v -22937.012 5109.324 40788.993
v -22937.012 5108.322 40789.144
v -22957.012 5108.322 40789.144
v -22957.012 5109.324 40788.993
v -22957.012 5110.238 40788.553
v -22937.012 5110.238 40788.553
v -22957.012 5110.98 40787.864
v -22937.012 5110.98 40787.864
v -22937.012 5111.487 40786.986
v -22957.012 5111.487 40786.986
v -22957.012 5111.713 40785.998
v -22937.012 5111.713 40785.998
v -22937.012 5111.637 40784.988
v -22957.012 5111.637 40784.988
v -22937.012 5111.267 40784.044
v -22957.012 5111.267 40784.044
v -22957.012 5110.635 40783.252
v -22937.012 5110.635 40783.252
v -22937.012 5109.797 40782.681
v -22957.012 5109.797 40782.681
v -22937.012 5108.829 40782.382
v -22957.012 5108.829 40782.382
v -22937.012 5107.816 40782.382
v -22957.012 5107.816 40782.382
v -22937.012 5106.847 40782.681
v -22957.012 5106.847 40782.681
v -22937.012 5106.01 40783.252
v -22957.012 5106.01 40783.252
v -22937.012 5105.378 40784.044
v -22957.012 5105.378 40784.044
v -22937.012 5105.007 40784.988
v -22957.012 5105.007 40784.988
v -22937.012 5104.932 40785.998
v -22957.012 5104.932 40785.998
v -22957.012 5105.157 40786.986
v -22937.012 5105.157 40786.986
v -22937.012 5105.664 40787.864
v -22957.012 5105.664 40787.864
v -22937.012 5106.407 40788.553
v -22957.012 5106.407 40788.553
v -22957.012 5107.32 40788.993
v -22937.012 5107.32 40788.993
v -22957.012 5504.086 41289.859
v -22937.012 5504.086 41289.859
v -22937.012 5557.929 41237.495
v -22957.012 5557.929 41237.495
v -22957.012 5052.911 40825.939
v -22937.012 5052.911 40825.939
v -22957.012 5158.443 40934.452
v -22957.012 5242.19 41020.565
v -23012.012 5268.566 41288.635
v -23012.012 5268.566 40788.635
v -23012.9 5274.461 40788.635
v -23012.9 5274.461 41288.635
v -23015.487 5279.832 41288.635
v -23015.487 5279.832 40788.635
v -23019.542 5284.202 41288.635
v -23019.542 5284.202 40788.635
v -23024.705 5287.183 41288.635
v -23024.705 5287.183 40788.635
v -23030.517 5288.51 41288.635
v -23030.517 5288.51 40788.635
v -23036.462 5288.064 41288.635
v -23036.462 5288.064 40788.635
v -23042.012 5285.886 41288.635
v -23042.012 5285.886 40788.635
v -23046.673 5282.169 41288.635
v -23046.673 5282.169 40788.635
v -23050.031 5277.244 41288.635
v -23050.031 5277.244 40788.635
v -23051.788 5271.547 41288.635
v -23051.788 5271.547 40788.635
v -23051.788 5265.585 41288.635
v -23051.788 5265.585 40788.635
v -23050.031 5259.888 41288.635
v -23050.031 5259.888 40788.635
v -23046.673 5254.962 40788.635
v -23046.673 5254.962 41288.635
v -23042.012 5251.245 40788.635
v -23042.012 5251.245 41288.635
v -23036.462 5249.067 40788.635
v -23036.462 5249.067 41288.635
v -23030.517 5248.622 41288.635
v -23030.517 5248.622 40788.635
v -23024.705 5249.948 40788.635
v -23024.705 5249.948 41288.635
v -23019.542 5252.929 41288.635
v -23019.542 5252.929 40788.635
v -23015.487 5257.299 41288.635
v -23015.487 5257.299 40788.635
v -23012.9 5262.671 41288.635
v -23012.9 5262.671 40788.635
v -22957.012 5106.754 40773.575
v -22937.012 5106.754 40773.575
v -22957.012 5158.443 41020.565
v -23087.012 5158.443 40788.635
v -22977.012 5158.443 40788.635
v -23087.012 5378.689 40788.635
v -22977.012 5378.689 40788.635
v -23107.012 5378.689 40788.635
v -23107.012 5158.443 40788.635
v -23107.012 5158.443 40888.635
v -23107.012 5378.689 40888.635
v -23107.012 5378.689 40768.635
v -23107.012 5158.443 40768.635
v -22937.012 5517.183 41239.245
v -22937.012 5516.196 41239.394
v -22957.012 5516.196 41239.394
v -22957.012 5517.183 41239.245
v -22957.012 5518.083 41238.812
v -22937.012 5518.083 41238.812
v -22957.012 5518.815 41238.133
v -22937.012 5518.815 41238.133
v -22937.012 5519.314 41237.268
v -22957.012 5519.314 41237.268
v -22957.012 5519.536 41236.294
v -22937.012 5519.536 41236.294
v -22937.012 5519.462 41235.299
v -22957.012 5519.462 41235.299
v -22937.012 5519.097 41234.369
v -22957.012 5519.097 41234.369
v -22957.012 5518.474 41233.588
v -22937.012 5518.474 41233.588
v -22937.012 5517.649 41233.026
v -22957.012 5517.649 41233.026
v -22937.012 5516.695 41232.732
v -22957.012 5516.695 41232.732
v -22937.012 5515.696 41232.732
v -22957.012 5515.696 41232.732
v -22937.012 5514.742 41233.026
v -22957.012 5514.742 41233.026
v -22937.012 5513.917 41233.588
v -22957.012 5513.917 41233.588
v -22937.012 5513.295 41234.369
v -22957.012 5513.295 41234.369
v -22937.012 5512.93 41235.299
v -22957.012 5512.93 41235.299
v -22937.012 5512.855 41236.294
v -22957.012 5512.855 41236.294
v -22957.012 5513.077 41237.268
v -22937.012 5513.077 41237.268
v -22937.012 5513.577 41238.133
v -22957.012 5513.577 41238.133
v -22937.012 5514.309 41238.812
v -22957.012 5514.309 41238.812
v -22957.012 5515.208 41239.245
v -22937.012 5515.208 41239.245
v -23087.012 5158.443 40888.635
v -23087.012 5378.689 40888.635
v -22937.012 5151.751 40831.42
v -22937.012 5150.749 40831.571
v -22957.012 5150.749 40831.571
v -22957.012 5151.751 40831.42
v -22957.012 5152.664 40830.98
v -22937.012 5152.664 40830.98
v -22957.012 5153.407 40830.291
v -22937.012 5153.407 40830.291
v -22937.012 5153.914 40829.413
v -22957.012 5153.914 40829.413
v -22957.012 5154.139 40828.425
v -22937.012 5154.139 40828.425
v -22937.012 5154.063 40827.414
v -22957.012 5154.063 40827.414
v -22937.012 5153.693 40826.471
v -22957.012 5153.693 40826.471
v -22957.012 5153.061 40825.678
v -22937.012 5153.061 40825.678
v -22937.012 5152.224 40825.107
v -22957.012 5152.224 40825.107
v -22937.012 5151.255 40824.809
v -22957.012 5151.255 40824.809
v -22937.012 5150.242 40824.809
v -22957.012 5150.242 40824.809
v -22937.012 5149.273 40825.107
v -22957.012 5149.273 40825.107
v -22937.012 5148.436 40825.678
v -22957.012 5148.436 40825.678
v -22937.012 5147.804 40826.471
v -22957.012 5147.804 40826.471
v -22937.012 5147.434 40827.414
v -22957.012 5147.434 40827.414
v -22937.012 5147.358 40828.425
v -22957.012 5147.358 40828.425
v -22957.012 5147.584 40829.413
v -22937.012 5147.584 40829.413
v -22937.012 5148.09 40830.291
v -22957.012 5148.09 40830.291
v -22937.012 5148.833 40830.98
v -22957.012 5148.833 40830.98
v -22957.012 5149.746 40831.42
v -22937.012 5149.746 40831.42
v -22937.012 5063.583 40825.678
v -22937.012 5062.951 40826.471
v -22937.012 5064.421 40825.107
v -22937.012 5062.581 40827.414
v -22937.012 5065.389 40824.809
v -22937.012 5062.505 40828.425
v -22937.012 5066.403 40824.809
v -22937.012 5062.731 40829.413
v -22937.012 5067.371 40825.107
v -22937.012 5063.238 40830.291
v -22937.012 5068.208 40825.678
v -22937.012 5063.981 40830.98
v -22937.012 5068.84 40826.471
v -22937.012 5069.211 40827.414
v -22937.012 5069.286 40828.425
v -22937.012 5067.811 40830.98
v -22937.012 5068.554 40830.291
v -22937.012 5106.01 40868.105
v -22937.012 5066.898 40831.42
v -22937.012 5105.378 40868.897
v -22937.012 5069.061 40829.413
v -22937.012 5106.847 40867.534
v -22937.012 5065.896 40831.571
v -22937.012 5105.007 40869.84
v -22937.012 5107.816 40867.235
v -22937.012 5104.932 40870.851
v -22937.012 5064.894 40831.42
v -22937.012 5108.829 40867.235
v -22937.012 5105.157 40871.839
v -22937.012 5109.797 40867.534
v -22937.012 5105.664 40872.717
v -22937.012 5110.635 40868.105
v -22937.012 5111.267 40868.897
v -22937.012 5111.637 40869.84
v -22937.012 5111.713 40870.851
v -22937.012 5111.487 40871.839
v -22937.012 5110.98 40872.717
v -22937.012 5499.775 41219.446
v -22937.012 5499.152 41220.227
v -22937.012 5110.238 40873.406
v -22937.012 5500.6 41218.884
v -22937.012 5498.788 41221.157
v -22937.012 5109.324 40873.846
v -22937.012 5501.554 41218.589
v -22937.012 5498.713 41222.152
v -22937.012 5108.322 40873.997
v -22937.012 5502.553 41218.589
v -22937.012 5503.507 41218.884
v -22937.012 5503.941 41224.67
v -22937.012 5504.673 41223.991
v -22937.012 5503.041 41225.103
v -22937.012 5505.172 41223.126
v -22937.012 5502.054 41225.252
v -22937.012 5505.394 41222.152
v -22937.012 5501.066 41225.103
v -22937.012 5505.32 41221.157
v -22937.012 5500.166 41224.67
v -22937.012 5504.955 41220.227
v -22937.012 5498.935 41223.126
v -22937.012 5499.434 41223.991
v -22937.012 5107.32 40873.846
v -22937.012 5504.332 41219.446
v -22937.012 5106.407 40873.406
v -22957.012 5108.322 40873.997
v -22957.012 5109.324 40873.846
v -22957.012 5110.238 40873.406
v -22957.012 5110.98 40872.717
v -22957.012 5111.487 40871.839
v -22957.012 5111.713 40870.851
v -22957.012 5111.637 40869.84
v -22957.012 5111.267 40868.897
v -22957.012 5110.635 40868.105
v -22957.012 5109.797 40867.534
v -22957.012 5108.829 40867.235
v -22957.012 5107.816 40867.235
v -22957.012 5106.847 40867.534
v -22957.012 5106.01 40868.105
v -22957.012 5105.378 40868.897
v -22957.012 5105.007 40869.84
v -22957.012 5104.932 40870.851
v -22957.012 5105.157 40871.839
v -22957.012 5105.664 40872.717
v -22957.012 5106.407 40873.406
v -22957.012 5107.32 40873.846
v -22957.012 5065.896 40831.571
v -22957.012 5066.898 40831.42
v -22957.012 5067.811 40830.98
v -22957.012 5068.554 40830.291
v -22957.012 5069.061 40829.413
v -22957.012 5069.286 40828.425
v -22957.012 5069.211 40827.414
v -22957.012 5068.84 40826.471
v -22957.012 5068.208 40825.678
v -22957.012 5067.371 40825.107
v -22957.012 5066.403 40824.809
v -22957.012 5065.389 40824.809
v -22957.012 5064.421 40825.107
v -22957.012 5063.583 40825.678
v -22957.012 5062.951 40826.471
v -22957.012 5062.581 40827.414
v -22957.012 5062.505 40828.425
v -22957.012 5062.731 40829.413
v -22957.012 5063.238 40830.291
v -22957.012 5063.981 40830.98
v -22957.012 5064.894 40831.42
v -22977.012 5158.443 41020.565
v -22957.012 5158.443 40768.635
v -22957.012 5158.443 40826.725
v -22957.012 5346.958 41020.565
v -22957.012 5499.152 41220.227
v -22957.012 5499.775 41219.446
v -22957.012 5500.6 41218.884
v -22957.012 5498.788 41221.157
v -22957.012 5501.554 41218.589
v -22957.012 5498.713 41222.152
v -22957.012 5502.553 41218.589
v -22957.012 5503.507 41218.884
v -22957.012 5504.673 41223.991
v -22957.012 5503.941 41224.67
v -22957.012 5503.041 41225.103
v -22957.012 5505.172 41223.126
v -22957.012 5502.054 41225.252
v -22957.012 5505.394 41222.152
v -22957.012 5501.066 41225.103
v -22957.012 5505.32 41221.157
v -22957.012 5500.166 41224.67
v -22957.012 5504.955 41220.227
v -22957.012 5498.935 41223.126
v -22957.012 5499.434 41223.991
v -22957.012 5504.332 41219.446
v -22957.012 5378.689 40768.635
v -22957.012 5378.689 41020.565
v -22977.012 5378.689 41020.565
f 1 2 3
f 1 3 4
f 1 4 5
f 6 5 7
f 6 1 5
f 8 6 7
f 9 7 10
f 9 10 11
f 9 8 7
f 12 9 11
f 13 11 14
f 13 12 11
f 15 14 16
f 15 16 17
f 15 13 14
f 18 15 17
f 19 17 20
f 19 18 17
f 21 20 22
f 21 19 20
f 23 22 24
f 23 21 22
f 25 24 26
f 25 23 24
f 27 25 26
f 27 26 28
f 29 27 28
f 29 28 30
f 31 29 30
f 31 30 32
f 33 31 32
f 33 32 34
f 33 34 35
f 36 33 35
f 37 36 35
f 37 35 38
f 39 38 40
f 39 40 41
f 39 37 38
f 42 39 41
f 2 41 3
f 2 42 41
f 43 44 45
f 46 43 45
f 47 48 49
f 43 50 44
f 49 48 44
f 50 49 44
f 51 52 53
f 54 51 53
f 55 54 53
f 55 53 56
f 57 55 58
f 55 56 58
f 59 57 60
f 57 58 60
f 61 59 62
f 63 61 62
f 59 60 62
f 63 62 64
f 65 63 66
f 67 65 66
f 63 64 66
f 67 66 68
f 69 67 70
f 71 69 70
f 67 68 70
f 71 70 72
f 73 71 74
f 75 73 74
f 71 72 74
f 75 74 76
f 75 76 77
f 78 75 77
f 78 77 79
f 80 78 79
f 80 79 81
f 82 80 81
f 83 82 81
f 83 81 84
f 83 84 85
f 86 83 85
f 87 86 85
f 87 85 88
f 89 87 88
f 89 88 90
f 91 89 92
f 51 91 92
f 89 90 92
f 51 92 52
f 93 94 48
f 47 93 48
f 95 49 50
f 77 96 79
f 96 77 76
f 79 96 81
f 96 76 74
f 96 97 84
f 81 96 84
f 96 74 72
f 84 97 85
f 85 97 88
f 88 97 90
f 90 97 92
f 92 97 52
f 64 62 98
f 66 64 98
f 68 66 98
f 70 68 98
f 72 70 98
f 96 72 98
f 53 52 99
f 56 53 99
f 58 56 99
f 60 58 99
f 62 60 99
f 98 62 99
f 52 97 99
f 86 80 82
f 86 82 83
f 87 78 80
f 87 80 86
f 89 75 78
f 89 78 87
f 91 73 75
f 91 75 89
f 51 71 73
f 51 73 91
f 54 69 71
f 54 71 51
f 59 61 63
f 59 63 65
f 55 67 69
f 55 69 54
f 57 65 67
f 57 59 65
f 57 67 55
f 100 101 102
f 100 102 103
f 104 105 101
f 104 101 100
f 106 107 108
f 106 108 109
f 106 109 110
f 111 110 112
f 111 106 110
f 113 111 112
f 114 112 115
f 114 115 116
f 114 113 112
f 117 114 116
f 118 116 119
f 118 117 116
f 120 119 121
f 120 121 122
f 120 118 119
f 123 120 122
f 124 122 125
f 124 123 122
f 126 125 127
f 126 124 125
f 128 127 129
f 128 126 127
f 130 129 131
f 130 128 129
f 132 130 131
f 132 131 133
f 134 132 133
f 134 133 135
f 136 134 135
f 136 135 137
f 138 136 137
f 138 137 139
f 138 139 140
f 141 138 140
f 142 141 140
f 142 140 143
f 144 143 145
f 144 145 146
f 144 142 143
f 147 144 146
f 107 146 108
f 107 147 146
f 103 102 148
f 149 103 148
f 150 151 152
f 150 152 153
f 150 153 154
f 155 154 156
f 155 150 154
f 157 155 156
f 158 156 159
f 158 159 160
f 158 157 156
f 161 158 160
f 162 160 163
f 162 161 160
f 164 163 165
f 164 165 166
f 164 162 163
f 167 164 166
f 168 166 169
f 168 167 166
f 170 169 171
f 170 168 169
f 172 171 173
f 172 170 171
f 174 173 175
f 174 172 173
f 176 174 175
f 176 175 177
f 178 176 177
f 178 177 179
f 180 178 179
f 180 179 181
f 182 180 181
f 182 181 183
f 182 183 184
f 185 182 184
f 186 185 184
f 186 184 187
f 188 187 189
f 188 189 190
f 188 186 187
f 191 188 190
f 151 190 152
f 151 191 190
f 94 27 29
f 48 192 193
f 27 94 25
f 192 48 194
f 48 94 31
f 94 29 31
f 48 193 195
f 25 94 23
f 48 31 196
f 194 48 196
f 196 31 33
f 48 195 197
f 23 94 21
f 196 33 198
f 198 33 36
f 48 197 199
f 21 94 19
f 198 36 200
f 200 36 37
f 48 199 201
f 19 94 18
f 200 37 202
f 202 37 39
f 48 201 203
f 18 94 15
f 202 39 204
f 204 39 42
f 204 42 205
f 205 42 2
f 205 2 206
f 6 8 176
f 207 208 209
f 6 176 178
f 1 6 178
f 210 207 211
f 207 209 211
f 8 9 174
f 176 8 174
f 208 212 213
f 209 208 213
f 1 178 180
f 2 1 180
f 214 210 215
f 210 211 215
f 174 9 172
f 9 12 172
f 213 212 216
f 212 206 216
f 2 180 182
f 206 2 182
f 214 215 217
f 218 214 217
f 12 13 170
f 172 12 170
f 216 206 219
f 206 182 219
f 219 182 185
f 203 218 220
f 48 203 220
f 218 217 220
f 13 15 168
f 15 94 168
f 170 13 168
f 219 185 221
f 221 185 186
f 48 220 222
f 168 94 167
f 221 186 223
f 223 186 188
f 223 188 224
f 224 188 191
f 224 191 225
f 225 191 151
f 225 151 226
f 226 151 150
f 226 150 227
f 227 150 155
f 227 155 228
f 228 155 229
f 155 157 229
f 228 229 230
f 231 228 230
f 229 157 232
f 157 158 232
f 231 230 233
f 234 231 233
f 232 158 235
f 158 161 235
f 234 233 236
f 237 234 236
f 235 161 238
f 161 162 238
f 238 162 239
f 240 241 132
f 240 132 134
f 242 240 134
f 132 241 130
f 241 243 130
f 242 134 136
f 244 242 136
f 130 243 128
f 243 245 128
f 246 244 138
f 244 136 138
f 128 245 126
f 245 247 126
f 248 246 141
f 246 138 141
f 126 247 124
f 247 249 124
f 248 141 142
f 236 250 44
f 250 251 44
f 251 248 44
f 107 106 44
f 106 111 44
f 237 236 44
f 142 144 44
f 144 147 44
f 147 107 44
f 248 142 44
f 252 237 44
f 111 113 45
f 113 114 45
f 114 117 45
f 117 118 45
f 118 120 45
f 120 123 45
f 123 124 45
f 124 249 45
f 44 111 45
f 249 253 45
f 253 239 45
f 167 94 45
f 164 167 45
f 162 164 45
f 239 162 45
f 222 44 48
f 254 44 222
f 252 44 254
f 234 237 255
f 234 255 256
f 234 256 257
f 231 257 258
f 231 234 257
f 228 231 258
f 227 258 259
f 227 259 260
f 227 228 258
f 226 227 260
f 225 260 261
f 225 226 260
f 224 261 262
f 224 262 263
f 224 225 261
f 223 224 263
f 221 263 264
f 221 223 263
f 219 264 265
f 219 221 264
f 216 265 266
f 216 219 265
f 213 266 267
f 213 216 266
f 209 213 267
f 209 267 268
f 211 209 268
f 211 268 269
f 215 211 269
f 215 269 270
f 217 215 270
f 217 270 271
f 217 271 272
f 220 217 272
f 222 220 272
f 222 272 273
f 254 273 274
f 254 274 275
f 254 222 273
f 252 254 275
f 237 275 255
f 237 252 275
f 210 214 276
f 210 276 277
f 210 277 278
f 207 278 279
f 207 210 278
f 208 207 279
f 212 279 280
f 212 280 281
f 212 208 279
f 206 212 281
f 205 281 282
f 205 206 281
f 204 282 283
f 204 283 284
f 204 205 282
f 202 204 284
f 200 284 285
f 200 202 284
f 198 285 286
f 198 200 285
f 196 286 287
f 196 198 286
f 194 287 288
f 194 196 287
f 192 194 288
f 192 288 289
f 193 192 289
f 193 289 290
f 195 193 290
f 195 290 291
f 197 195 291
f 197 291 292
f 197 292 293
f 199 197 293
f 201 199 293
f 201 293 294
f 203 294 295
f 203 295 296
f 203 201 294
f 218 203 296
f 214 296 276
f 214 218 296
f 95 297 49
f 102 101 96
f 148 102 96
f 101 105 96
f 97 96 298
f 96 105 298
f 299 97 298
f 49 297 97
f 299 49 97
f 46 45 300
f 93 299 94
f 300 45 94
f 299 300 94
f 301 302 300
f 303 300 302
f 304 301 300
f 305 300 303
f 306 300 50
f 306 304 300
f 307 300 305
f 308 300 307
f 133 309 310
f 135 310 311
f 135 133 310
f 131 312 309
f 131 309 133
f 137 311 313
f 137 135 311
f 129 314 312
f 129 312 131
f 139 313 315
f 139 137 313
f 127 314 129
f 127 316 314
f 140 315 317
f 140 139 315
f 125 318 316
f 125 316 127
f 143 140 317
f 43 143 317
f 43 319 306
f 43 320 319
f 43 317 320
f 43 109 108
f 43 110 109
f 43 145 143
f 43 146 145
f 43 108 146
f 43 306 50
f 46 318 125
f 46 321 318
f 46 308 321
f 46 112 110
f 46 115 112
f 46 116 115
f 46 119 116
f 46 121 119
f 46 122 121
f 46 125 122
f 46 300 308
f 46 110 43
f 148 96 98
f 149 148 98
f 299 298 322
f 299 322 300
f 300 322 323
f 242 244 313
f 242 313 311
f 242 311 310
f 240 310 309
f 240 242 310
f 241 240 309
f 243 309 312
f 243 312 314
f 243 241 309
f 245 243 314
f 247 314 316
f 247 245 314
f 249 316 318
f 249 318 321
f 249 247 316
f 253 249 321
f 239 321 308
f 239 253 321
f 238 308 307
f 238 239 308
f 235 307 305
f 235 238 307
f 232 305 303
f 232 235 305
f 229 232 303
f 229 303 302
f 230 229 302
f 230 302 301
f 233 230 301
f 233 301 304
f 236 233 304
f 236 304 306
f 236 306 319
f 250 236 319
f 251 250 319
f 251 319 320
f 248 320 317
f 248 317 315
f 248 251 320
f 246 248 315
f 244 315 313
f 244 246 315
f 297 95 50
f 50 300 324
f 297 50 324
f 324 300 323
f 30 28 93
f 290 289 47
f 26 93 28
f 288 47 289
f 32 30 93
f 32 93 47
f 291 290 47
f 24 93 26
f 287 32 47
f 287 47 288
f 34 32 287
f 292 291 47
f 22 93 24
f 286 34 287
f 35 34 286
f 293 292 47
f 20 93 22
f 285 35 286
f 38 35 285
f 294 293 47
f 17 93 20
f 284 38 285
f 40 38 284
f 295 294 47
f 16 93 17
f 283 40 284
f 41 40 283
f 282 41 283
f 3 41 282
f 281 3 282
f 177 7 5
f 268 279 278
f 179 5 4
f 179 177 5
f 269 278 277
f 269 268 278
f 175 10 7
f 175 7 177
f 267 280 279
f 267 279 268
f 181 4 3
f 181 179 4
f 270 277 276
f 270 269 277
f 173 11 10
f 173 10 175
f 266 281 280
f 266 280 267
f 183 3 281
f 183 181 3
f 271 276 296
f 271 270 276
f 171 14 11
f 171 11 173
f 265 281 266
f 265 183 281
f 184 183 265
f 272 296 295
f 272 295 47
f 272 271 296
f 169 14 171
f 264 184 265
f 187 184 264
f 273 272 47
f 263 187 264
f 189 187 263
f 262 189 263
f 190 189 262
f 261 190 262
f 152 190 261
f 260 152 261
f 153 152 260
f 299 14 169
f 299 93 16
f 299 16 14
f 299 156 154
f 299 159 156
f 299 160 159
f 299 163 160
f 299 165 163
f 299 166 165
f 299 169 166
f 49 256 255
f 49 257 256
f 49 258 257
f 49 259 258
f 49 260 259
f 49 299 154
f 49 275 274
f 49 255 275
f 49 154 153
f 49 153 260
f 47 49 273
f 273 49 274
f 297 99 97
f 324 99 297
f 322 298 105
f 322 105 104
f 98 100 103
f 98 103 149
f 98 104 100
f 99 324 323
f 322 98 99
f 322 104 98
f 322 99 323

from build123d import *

# Parameters (mm, degrees)
SKETCH1_R           = 3.35
SKETCH1_R_2         = 3.4
BOSS_EXTRUDE1_DEPTH = 20
SKETCH2_W           = 231.929502284
SKETCH2_H           = 220.245456765
BOSS_EXTRUDE2_DEPTH = 20
SKETCH3_W           = 20
SKETCH3_H           = 220.245456765
BOSS_EXTRUDE3_DEPTH = 150
SKETCH4_W           = 20
SKETCH4_H           = 220.245456765
BOSS_EXTRUDE4_DEPTH = 100
SKETCH5_R           = 20
BOSS_EXTRUDE5_DEPTH = 500


with BuildPart() as part:
    # Sketch1 → Boss-Extrude1 (new body)
    with BuildSketch(Plane.ZY.offset(22937.011755361)):
        Polygon((41237.494779256, 5557.929358856), (40773.575398624, 5106.753906388), (40825.939297891, 5052.910933366), (41289.858678523, 5504.086385835), align=None)
        with Locations((41221.902000531, 5502.053605549)):
            Circle(SKETCH1_R, mode=Mode.SUBTRACT)
        with Locations((41236.044136152, 5516.195741176)):
            Circle(SKETCH1_R, mode=Mode.SUBTRACT)
        with Locations((40870.597048417, 5108.322246569)):
            Circle(SKETCH1_R_2, mode=Mode.SUBTRACT)
        with Locations((40828.170641545, 5065.895839698)):
            Circle(SKETCH1_R_2, mode=Mode.SUBTRACT)
        with Locations((40828.170641545, 5150.74865344)):
            Circle(SKETCH1_R_2, mode=Mode.SUBTRACT)
        with Locations((40785.744234674, 5108.322246569)):
            Circle(SKETCH1_R_2, mode=Mode.SUBTRACT)
    extrude(amount=BOSS_EXTRUDE1_DEPTH)

    # Sketch2 → Boss-Extrude2 (add)
    with BuildSketch(Plane.ZY.offset(22957.011755361)):
        with Locations((40904.599781001, 5268.565849628)):
            Rectangle(SKETCH2_W, SKETCH2_H)
    extrude(amount=BOSS_EXTRUDE2_DEPTH)

    # Sketch3 → Boss-Extrude3 (add)
    with BuildSketch(Plane.ZY.offset(22957.011755361)):
        with Locations((40778.635029859, 5268.565849628)):
            Rectangle(SKETCH3_W, SKETCH3_H)
    extrude(amount=BOSS_EXTRUDE3_DEPTH)

    # Sketch4 → Boss-Extrude4 (add)
    with BuildSketch(Plane.XY.offset(40788.635029859)):
        with Locations((-23097.01175536, 5268.565849628)):
            Rectangle(SKETCH4_W, SKETCH4_H)
    extrude(amount=BOSS_EXTRUDE4_DEPTH)

    # Sketch5 → Boss-Extrude5 (add)
    with BuildSketch(Plane.XY.offset(40788.635029859)):
        with Locations((-23032.01175536, 5268.565849628)):
            Circle(SKETCH5_R)
    extrude(amount=BOSS_EXTRUDE5_DEPTH)


solid = part.part
